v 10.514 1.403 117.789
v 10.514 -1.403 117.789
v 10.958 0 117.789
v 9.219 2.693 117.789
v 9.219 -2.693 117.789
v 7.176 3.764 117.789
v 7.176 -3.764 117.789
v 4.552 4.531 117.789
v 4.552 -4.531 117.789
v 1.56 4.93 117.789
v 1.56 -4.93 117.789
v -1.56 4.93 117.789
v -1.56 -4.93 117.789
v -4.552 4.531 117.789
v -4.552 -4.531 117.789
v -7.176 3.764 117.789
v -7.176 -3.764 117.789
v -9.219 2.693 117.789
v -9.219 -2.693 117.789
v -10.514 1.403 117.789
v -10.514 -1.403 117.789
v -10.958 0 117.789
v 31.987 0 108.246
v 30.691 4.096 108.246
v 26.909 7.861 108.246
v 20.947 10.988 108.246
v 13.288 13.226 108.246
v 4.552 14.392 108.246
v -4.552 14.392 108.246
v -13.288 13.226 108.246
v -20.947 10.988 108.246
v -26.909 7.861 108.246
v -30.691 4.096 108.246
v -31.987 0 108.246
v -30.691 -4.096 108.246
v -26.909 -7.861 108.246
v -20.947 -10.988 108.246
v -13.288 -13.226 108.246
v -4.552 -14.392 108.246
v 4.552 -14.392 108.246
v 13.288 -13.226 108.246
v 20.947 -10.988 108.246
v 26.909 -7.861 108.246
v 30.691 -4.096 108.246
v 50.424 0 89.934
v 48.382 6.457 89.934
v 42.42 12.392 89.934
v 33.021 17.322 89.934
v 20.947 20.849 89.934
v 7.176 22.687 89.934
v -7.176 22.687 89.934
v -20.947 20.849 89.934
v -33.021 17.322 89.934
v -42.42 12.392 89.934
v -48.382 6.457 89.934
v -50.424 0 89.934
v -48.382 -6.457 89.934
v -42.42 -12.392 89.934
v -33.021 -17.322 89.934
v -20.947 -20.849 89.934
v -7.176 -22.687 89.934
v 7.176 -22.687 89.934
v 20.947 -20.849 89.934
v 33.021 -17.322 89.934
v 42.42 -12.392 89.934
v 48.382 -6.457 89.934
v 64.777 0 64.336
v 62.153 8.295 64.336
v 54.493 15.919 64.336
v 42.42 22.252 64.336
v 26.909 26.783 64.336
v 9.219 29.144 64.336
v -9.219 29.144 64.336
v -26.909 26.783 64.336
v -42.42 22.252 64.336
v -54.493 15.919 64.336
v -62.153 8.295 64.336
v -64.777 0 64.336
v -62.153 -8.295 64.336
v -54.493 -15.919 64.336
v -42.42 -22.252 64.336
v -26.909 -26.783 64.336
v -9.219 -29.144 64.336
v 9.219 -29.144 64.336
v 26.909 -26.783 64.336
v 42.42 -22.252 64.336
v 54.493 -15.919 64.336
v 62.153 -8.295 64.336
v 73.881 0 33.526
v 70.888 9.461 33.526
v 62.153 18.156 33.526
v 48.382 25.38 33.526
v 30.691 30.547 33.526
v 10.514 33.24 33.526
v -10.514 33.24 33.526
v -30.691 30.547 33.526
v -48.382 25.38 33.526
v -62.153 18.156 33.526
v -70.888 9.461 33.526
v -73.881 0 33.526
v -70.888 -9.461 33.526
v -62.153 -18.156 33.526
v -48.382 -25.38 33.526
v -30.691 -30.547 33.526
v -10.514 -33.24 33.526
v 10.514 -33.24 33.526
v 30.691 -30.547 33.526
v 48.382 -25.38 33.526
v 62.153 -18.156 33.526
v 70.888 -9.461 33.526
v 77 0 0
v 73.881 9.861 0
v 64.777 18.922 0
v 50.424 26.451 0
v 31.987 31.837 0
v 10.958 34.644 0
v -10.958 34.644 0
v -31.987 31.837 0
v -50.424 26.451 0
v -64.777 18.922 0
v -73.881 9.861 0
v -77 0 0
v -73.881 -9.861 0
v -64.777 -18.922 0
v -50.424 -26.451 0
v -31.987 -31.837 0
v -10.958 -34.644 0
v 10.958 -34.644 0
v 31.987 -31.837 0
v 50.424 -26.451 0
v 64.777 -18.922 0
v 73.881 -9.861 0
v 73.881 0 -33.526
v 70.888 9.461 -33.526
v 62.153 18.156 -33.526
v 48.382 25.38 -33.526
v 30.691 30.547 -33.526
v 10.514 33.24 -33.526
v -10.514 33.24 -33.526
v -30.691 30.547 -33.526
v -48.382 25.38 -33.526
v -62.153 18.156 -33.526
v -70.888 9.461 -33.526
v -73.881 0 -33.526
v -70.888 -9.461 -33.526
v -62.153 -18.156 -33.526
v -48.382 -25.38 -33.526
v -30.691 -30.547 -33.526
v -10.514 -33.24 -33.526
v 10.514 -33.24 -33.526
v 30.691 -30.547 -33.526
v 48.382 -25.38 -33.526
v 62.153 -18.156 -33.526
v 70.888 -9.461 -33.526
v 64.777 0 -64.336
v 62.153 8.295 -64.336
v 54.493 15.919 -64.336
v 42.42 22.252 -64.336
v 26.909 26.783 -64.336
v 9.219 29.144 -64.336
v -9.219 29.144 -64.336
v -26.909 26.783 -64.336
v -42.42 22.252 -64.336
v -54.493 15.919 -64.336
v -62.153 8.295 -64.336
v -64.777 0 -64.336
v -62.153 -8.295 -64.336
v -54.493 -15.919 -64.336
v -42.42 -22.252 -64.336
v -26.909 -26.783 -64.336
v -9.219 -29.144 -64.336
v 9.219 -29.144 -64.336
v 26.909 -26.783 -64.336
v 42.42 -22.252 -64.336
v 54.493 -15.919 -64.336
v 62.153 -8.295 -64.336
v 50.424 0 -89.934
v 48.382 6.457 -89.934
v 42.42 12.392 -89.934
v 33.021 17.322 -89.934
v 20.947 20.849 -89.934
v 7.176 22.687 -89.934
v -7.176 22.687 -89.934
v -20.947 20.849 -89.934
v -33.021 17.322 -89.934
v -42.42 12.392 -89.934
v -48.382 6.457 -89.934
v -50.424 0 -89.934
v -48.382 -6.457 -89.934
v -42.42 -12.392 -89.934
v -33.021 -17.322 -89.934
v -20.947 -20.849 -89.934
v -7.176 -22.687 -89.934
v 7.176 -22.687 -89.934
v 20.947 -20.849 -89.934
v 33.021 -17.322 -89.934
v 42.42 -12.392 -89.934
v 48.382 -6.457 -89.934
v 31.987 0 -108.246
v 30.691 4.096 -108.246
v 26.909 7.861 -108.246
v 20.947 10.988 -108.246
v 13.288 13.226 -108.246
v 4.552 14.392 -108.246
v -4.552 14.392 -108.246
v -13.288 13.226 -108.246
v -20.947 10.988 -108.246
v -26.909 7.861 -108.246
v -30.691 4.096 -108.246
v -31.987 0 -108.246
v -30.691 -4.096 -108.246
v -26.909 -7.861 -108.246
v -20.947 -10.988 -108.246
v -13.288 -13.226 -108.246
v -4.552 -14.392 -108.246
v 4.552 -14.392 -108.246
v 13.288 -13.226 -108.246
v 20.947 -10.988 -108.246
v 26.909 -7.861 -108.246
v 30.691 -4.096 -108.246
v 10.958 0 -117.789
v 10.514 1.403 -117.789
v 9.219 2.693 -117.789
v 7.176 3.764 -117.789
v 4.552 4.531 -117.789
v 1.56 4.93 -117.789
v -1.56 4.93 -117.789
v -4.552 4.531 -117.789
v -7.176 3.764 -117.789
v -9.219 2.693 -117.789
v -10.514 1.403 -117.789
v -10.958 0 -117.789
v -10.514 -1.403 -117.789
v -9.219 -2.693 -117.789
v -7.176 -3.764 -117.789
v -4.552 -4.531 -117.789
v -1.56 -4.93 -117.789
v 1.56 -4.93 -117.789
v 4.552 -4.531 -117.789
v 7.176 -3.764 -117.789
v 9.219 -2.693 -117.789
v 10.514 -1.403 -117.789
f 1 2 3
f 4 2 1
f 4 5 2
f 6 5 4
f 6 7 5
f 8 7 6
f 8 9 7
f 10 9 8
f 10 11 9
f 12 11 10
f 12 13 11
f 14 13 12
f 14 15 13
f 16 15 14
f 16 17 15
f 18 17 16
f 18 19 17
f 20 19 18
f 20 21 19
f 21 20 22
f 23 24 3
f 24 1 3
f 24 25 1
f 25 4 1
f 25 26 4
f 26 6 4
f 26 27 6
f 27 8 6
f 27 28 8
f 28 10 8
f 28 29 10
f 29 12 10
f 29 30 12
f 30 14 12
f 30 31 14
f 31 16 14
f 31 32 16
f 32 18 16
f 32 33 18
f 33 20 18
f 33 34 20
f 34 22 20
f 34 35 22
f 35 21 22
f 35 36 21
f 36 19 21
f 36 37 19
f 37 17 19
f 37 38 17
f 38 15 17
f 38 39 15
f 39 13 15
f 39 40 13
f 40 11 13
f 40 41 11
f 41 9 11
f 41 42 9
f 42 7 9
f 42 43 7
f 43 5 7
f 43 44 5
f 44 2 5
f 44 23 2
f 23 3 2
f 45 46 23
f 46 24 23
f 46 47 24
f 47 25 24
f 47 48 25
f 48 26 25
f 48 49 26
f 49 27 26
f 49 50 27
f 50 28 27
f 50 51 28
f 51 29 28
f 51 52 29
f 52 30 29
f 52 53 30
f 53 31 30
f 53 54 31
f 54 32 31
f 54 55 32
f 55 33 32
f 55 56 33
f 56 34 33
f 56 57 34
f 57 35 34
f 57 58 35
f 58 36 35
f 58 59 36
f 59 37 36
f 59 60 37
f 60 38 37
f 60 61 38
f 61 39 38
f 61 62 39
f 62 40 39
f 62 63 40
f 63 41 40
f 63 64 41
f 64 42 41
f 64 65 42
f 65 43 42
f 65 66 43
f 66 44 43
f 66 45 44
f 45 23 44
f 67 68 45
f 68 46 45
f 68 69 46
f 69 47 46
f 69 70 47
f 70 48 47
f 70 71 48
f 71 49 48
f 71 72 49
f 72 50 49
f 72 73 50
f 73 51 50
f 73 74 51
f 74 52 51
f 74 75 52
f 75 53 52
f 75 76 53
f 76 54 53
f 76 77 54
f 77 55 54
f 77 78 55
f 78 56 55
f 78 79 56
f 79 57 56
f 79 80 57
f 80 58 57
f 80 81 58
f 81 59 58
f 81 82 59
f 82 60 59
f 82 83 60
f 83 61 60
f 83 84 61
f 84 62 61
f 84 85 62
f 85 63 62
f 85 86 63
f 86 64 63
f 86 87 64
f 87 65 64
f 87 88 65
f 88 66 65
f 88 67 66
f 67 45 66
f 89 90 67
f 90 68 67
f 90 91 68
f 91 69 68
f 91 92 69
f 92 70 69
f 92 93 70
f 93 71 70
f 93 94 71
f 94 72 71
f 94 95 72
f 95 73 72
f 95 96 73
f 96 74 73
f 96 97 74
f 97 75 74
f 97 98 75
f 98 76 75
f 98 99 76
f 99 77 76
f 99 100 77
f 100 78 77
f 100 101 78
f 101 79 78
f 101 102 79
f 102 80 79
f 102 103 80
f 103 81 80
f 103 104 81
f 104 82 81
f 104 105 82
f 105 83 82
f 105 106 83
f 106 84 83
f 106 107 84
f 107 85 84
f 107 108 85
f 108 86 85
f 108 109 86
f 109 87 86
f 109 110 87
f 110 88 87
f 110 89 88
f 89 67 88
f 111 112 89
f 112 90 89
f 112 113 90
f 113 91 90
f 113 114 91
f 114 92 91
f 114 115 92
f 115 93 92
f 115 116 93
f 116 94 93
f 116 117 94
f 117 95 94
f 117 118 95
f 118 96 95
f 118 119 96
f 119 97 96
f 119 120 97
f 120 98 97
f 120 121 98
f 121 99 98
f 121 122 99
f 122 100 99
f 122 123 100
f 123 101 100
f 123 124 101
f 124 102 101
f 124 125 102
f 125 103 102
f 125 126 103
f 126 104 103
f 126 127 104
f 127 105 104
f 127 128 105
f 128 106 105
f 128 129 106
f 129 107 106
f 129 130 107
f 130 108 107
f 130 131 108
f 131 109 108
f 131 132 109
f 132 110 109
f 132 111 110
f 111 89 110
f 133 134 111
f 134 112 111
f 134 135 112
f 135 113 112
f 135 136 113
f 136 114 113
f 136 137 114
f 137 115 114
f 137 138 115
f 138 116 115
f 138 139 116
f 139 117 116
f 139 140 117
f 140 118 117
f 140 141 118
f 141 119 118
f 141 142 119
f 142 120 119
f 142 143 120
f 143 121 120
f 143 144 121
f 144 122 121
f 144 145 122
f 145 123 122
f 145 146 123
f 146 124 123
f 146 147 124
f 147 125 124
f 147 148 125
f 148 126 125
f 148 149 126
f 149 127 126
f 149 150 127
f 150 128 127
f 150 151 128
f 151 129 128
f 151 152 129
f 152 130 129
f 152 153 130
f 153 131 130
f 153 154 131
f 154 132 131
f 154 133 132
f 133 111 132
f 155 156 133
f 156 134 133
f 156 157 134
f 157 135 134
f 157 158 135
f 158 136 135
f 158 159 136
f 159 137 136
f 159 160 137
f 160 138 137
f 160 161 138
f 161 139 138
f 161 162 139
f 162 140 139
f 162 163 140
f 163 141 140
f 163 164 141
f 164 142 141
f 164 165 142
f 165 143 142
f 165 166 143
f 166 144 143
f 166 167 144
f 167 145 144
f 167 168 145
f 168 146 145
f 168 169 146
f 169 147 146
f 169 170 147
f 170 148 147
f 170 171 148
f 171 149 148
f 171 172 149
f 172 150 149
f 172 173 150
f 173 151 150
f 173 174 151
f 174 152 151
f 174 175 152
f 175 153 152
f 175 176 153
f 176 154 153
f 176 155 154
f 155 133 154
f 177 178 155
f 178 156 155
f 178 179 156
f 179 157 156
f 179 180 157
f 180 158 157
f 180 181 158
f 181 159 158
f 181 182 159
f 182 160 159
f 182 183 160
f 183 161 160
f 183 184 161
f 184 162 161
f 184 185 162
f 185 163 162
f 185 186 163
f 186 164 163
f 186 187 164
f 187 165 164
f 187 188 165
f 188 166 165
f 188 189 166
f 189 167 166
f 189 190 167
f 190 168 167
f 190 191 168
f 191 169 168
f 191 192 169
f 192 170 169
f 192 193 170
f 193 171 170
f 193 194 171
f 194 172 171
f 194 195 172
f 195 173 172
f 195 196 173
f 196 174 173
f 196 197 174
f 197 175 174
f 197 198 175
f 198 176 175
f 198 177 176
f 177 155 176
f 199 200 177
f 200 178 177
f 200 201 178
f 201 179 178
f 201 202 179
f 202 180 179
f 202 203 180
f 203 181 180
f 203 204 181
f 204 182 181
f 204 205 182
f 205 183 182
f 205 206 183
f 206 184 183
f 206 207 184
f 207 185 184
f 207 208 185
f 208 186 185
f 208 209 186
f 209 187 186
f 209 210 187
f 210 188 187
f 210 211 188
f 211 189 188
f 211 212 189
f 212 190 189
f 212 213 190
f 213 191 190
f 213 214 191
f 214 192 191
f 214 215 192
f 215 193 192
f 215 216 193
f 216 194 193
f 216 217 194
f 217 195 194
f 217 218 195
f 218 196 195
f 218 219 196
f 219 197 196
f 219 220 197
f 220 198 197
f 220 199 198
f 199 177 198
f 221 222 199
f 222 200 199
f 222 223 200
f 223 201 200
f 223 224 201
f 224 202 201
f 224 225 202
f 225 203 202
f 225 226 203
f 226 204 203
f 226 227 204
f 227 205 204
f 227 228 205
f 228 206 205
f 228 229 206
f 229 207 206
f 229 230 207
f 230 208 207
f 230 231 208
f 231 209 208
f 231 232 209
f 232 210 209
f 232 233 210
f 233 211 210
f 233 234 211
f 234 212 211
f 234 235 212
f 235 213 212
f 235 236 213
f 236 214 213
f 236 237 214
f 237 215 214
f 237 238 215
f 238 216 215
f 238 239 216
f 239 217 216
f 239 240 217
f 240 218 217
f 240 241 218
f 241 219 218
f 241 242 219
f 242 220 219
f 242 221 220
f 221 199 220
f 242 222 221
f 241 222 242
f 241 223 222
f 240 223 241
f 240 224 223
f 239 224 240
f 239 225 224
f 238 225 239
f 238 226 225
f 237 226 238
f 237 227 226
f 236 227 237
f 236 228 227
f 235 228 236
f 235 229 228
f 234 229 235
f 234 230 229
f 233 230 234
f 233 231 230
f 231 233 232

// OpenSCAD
// Generated by SolidPython 1.0.1 on 2020-07-29 00:46:49


scale(v = [11, 5, 17]) {
	sphere(r = 7);
}
/***********************************************
*********      SolidPython code:      **********
************************************************
 
# import packages: SolidPython
from solid import *
from solid.utils import *
from itertools import chain, combinations, permutations


class Resize:

    def __init__(self, scad_file):
        self.scad_file = scad_file
        #self.scad_file = import_scad(scad_file)
        # cone/cylinder param:
        self.r1 = 0
        self.r2 = 0
        self.h = 0
        # rectangular prism param:
        self.w = 0
        self.l = 0
        # ellipse param:
        self.r = 0

    # import OpenScad code (file name corresponds to shape)


    # classify shape + parameters
    def assign(self, param1, param2, param3):
        if self.scad_file == 'cone.scad':
            self.r1 = param1
            self.r2 = param2
            self.h = param3
        elif self.scad_file == 'cylinder.scad':
            self.r1 = param1
            self.r2 = param2
            self.h = param3
        elif self.scad_file == 'rectangularPrism.scad':
            self.h = param1
            self.l = param2
            self.w = param3
        else:
            self.r = param1
            self.h = param2

    # resize parameters
    def iterate(self):
        x = range(3, 20, 2)
        i = 1
        if self.scad_file == 'cone.scad':
            tempList = list(permutations(x, 2))
            for temp in tempList:
                param1 = temp[0]
                param2 = temp[1]
                filepath = 'produced_scad_files/' + 'cone' + str(param1) + '_' + str(param2) + '_' + '.scad'
                scad_render_to_file(cylinder(h=param1, r1=param2, r2=0), filepath)

        elif self.scad_file == 'cylinder.scad':
            tempList = list(permutations(x, 3))
            for temp in tempList:
                param1 = temp[0]
                param2 = temp[1]
                filepath = 'produced_scad_files/' + 'cylinder' + str(param1) + '_' + str(param2) + '_' + '.scad'
                scad_render_to_file(cylinder(h=param1, r1=param2, r2=param2), filepath)

        elif self.scad_file == 'rectangularPrism.scad':
            tempList = list(permutations(x, 3))
            for temp in tempList:
                param1 = temp[0]
                param2 = temp[1]
                param3 = temp[2]
                filepath = 'produced_scad_files/' + 'rectangularPrism' + str(param1) + '_' + str(param2) + '_' + str(
                    param3) + '.scad'
                scad_render_to_file(cube(size=(param1, param2, param3)), filepath)

        elif self.scad_file == 'ellipse.scad':
            tempList = list(permutations(x, 4))
            for temp in tempList:
                param1 = temp[0]
                param2 = temp[1]
                param3 = temp[2]
                param4 = temp[3]
                filepath = 'produced_scad_files/' + 'ellipse' + str(param1) + '_' + str(param2) + '_' + str(param3) + '_' + str(param4) + '.scad'
                scad_render_to_file(scale([param1, param2, param3])(sphere(r=param4)), filepath)

    def render_to_scadfile(self):
        scad_render_to_file(scad, 'example.scad') 
 
************************************************/
